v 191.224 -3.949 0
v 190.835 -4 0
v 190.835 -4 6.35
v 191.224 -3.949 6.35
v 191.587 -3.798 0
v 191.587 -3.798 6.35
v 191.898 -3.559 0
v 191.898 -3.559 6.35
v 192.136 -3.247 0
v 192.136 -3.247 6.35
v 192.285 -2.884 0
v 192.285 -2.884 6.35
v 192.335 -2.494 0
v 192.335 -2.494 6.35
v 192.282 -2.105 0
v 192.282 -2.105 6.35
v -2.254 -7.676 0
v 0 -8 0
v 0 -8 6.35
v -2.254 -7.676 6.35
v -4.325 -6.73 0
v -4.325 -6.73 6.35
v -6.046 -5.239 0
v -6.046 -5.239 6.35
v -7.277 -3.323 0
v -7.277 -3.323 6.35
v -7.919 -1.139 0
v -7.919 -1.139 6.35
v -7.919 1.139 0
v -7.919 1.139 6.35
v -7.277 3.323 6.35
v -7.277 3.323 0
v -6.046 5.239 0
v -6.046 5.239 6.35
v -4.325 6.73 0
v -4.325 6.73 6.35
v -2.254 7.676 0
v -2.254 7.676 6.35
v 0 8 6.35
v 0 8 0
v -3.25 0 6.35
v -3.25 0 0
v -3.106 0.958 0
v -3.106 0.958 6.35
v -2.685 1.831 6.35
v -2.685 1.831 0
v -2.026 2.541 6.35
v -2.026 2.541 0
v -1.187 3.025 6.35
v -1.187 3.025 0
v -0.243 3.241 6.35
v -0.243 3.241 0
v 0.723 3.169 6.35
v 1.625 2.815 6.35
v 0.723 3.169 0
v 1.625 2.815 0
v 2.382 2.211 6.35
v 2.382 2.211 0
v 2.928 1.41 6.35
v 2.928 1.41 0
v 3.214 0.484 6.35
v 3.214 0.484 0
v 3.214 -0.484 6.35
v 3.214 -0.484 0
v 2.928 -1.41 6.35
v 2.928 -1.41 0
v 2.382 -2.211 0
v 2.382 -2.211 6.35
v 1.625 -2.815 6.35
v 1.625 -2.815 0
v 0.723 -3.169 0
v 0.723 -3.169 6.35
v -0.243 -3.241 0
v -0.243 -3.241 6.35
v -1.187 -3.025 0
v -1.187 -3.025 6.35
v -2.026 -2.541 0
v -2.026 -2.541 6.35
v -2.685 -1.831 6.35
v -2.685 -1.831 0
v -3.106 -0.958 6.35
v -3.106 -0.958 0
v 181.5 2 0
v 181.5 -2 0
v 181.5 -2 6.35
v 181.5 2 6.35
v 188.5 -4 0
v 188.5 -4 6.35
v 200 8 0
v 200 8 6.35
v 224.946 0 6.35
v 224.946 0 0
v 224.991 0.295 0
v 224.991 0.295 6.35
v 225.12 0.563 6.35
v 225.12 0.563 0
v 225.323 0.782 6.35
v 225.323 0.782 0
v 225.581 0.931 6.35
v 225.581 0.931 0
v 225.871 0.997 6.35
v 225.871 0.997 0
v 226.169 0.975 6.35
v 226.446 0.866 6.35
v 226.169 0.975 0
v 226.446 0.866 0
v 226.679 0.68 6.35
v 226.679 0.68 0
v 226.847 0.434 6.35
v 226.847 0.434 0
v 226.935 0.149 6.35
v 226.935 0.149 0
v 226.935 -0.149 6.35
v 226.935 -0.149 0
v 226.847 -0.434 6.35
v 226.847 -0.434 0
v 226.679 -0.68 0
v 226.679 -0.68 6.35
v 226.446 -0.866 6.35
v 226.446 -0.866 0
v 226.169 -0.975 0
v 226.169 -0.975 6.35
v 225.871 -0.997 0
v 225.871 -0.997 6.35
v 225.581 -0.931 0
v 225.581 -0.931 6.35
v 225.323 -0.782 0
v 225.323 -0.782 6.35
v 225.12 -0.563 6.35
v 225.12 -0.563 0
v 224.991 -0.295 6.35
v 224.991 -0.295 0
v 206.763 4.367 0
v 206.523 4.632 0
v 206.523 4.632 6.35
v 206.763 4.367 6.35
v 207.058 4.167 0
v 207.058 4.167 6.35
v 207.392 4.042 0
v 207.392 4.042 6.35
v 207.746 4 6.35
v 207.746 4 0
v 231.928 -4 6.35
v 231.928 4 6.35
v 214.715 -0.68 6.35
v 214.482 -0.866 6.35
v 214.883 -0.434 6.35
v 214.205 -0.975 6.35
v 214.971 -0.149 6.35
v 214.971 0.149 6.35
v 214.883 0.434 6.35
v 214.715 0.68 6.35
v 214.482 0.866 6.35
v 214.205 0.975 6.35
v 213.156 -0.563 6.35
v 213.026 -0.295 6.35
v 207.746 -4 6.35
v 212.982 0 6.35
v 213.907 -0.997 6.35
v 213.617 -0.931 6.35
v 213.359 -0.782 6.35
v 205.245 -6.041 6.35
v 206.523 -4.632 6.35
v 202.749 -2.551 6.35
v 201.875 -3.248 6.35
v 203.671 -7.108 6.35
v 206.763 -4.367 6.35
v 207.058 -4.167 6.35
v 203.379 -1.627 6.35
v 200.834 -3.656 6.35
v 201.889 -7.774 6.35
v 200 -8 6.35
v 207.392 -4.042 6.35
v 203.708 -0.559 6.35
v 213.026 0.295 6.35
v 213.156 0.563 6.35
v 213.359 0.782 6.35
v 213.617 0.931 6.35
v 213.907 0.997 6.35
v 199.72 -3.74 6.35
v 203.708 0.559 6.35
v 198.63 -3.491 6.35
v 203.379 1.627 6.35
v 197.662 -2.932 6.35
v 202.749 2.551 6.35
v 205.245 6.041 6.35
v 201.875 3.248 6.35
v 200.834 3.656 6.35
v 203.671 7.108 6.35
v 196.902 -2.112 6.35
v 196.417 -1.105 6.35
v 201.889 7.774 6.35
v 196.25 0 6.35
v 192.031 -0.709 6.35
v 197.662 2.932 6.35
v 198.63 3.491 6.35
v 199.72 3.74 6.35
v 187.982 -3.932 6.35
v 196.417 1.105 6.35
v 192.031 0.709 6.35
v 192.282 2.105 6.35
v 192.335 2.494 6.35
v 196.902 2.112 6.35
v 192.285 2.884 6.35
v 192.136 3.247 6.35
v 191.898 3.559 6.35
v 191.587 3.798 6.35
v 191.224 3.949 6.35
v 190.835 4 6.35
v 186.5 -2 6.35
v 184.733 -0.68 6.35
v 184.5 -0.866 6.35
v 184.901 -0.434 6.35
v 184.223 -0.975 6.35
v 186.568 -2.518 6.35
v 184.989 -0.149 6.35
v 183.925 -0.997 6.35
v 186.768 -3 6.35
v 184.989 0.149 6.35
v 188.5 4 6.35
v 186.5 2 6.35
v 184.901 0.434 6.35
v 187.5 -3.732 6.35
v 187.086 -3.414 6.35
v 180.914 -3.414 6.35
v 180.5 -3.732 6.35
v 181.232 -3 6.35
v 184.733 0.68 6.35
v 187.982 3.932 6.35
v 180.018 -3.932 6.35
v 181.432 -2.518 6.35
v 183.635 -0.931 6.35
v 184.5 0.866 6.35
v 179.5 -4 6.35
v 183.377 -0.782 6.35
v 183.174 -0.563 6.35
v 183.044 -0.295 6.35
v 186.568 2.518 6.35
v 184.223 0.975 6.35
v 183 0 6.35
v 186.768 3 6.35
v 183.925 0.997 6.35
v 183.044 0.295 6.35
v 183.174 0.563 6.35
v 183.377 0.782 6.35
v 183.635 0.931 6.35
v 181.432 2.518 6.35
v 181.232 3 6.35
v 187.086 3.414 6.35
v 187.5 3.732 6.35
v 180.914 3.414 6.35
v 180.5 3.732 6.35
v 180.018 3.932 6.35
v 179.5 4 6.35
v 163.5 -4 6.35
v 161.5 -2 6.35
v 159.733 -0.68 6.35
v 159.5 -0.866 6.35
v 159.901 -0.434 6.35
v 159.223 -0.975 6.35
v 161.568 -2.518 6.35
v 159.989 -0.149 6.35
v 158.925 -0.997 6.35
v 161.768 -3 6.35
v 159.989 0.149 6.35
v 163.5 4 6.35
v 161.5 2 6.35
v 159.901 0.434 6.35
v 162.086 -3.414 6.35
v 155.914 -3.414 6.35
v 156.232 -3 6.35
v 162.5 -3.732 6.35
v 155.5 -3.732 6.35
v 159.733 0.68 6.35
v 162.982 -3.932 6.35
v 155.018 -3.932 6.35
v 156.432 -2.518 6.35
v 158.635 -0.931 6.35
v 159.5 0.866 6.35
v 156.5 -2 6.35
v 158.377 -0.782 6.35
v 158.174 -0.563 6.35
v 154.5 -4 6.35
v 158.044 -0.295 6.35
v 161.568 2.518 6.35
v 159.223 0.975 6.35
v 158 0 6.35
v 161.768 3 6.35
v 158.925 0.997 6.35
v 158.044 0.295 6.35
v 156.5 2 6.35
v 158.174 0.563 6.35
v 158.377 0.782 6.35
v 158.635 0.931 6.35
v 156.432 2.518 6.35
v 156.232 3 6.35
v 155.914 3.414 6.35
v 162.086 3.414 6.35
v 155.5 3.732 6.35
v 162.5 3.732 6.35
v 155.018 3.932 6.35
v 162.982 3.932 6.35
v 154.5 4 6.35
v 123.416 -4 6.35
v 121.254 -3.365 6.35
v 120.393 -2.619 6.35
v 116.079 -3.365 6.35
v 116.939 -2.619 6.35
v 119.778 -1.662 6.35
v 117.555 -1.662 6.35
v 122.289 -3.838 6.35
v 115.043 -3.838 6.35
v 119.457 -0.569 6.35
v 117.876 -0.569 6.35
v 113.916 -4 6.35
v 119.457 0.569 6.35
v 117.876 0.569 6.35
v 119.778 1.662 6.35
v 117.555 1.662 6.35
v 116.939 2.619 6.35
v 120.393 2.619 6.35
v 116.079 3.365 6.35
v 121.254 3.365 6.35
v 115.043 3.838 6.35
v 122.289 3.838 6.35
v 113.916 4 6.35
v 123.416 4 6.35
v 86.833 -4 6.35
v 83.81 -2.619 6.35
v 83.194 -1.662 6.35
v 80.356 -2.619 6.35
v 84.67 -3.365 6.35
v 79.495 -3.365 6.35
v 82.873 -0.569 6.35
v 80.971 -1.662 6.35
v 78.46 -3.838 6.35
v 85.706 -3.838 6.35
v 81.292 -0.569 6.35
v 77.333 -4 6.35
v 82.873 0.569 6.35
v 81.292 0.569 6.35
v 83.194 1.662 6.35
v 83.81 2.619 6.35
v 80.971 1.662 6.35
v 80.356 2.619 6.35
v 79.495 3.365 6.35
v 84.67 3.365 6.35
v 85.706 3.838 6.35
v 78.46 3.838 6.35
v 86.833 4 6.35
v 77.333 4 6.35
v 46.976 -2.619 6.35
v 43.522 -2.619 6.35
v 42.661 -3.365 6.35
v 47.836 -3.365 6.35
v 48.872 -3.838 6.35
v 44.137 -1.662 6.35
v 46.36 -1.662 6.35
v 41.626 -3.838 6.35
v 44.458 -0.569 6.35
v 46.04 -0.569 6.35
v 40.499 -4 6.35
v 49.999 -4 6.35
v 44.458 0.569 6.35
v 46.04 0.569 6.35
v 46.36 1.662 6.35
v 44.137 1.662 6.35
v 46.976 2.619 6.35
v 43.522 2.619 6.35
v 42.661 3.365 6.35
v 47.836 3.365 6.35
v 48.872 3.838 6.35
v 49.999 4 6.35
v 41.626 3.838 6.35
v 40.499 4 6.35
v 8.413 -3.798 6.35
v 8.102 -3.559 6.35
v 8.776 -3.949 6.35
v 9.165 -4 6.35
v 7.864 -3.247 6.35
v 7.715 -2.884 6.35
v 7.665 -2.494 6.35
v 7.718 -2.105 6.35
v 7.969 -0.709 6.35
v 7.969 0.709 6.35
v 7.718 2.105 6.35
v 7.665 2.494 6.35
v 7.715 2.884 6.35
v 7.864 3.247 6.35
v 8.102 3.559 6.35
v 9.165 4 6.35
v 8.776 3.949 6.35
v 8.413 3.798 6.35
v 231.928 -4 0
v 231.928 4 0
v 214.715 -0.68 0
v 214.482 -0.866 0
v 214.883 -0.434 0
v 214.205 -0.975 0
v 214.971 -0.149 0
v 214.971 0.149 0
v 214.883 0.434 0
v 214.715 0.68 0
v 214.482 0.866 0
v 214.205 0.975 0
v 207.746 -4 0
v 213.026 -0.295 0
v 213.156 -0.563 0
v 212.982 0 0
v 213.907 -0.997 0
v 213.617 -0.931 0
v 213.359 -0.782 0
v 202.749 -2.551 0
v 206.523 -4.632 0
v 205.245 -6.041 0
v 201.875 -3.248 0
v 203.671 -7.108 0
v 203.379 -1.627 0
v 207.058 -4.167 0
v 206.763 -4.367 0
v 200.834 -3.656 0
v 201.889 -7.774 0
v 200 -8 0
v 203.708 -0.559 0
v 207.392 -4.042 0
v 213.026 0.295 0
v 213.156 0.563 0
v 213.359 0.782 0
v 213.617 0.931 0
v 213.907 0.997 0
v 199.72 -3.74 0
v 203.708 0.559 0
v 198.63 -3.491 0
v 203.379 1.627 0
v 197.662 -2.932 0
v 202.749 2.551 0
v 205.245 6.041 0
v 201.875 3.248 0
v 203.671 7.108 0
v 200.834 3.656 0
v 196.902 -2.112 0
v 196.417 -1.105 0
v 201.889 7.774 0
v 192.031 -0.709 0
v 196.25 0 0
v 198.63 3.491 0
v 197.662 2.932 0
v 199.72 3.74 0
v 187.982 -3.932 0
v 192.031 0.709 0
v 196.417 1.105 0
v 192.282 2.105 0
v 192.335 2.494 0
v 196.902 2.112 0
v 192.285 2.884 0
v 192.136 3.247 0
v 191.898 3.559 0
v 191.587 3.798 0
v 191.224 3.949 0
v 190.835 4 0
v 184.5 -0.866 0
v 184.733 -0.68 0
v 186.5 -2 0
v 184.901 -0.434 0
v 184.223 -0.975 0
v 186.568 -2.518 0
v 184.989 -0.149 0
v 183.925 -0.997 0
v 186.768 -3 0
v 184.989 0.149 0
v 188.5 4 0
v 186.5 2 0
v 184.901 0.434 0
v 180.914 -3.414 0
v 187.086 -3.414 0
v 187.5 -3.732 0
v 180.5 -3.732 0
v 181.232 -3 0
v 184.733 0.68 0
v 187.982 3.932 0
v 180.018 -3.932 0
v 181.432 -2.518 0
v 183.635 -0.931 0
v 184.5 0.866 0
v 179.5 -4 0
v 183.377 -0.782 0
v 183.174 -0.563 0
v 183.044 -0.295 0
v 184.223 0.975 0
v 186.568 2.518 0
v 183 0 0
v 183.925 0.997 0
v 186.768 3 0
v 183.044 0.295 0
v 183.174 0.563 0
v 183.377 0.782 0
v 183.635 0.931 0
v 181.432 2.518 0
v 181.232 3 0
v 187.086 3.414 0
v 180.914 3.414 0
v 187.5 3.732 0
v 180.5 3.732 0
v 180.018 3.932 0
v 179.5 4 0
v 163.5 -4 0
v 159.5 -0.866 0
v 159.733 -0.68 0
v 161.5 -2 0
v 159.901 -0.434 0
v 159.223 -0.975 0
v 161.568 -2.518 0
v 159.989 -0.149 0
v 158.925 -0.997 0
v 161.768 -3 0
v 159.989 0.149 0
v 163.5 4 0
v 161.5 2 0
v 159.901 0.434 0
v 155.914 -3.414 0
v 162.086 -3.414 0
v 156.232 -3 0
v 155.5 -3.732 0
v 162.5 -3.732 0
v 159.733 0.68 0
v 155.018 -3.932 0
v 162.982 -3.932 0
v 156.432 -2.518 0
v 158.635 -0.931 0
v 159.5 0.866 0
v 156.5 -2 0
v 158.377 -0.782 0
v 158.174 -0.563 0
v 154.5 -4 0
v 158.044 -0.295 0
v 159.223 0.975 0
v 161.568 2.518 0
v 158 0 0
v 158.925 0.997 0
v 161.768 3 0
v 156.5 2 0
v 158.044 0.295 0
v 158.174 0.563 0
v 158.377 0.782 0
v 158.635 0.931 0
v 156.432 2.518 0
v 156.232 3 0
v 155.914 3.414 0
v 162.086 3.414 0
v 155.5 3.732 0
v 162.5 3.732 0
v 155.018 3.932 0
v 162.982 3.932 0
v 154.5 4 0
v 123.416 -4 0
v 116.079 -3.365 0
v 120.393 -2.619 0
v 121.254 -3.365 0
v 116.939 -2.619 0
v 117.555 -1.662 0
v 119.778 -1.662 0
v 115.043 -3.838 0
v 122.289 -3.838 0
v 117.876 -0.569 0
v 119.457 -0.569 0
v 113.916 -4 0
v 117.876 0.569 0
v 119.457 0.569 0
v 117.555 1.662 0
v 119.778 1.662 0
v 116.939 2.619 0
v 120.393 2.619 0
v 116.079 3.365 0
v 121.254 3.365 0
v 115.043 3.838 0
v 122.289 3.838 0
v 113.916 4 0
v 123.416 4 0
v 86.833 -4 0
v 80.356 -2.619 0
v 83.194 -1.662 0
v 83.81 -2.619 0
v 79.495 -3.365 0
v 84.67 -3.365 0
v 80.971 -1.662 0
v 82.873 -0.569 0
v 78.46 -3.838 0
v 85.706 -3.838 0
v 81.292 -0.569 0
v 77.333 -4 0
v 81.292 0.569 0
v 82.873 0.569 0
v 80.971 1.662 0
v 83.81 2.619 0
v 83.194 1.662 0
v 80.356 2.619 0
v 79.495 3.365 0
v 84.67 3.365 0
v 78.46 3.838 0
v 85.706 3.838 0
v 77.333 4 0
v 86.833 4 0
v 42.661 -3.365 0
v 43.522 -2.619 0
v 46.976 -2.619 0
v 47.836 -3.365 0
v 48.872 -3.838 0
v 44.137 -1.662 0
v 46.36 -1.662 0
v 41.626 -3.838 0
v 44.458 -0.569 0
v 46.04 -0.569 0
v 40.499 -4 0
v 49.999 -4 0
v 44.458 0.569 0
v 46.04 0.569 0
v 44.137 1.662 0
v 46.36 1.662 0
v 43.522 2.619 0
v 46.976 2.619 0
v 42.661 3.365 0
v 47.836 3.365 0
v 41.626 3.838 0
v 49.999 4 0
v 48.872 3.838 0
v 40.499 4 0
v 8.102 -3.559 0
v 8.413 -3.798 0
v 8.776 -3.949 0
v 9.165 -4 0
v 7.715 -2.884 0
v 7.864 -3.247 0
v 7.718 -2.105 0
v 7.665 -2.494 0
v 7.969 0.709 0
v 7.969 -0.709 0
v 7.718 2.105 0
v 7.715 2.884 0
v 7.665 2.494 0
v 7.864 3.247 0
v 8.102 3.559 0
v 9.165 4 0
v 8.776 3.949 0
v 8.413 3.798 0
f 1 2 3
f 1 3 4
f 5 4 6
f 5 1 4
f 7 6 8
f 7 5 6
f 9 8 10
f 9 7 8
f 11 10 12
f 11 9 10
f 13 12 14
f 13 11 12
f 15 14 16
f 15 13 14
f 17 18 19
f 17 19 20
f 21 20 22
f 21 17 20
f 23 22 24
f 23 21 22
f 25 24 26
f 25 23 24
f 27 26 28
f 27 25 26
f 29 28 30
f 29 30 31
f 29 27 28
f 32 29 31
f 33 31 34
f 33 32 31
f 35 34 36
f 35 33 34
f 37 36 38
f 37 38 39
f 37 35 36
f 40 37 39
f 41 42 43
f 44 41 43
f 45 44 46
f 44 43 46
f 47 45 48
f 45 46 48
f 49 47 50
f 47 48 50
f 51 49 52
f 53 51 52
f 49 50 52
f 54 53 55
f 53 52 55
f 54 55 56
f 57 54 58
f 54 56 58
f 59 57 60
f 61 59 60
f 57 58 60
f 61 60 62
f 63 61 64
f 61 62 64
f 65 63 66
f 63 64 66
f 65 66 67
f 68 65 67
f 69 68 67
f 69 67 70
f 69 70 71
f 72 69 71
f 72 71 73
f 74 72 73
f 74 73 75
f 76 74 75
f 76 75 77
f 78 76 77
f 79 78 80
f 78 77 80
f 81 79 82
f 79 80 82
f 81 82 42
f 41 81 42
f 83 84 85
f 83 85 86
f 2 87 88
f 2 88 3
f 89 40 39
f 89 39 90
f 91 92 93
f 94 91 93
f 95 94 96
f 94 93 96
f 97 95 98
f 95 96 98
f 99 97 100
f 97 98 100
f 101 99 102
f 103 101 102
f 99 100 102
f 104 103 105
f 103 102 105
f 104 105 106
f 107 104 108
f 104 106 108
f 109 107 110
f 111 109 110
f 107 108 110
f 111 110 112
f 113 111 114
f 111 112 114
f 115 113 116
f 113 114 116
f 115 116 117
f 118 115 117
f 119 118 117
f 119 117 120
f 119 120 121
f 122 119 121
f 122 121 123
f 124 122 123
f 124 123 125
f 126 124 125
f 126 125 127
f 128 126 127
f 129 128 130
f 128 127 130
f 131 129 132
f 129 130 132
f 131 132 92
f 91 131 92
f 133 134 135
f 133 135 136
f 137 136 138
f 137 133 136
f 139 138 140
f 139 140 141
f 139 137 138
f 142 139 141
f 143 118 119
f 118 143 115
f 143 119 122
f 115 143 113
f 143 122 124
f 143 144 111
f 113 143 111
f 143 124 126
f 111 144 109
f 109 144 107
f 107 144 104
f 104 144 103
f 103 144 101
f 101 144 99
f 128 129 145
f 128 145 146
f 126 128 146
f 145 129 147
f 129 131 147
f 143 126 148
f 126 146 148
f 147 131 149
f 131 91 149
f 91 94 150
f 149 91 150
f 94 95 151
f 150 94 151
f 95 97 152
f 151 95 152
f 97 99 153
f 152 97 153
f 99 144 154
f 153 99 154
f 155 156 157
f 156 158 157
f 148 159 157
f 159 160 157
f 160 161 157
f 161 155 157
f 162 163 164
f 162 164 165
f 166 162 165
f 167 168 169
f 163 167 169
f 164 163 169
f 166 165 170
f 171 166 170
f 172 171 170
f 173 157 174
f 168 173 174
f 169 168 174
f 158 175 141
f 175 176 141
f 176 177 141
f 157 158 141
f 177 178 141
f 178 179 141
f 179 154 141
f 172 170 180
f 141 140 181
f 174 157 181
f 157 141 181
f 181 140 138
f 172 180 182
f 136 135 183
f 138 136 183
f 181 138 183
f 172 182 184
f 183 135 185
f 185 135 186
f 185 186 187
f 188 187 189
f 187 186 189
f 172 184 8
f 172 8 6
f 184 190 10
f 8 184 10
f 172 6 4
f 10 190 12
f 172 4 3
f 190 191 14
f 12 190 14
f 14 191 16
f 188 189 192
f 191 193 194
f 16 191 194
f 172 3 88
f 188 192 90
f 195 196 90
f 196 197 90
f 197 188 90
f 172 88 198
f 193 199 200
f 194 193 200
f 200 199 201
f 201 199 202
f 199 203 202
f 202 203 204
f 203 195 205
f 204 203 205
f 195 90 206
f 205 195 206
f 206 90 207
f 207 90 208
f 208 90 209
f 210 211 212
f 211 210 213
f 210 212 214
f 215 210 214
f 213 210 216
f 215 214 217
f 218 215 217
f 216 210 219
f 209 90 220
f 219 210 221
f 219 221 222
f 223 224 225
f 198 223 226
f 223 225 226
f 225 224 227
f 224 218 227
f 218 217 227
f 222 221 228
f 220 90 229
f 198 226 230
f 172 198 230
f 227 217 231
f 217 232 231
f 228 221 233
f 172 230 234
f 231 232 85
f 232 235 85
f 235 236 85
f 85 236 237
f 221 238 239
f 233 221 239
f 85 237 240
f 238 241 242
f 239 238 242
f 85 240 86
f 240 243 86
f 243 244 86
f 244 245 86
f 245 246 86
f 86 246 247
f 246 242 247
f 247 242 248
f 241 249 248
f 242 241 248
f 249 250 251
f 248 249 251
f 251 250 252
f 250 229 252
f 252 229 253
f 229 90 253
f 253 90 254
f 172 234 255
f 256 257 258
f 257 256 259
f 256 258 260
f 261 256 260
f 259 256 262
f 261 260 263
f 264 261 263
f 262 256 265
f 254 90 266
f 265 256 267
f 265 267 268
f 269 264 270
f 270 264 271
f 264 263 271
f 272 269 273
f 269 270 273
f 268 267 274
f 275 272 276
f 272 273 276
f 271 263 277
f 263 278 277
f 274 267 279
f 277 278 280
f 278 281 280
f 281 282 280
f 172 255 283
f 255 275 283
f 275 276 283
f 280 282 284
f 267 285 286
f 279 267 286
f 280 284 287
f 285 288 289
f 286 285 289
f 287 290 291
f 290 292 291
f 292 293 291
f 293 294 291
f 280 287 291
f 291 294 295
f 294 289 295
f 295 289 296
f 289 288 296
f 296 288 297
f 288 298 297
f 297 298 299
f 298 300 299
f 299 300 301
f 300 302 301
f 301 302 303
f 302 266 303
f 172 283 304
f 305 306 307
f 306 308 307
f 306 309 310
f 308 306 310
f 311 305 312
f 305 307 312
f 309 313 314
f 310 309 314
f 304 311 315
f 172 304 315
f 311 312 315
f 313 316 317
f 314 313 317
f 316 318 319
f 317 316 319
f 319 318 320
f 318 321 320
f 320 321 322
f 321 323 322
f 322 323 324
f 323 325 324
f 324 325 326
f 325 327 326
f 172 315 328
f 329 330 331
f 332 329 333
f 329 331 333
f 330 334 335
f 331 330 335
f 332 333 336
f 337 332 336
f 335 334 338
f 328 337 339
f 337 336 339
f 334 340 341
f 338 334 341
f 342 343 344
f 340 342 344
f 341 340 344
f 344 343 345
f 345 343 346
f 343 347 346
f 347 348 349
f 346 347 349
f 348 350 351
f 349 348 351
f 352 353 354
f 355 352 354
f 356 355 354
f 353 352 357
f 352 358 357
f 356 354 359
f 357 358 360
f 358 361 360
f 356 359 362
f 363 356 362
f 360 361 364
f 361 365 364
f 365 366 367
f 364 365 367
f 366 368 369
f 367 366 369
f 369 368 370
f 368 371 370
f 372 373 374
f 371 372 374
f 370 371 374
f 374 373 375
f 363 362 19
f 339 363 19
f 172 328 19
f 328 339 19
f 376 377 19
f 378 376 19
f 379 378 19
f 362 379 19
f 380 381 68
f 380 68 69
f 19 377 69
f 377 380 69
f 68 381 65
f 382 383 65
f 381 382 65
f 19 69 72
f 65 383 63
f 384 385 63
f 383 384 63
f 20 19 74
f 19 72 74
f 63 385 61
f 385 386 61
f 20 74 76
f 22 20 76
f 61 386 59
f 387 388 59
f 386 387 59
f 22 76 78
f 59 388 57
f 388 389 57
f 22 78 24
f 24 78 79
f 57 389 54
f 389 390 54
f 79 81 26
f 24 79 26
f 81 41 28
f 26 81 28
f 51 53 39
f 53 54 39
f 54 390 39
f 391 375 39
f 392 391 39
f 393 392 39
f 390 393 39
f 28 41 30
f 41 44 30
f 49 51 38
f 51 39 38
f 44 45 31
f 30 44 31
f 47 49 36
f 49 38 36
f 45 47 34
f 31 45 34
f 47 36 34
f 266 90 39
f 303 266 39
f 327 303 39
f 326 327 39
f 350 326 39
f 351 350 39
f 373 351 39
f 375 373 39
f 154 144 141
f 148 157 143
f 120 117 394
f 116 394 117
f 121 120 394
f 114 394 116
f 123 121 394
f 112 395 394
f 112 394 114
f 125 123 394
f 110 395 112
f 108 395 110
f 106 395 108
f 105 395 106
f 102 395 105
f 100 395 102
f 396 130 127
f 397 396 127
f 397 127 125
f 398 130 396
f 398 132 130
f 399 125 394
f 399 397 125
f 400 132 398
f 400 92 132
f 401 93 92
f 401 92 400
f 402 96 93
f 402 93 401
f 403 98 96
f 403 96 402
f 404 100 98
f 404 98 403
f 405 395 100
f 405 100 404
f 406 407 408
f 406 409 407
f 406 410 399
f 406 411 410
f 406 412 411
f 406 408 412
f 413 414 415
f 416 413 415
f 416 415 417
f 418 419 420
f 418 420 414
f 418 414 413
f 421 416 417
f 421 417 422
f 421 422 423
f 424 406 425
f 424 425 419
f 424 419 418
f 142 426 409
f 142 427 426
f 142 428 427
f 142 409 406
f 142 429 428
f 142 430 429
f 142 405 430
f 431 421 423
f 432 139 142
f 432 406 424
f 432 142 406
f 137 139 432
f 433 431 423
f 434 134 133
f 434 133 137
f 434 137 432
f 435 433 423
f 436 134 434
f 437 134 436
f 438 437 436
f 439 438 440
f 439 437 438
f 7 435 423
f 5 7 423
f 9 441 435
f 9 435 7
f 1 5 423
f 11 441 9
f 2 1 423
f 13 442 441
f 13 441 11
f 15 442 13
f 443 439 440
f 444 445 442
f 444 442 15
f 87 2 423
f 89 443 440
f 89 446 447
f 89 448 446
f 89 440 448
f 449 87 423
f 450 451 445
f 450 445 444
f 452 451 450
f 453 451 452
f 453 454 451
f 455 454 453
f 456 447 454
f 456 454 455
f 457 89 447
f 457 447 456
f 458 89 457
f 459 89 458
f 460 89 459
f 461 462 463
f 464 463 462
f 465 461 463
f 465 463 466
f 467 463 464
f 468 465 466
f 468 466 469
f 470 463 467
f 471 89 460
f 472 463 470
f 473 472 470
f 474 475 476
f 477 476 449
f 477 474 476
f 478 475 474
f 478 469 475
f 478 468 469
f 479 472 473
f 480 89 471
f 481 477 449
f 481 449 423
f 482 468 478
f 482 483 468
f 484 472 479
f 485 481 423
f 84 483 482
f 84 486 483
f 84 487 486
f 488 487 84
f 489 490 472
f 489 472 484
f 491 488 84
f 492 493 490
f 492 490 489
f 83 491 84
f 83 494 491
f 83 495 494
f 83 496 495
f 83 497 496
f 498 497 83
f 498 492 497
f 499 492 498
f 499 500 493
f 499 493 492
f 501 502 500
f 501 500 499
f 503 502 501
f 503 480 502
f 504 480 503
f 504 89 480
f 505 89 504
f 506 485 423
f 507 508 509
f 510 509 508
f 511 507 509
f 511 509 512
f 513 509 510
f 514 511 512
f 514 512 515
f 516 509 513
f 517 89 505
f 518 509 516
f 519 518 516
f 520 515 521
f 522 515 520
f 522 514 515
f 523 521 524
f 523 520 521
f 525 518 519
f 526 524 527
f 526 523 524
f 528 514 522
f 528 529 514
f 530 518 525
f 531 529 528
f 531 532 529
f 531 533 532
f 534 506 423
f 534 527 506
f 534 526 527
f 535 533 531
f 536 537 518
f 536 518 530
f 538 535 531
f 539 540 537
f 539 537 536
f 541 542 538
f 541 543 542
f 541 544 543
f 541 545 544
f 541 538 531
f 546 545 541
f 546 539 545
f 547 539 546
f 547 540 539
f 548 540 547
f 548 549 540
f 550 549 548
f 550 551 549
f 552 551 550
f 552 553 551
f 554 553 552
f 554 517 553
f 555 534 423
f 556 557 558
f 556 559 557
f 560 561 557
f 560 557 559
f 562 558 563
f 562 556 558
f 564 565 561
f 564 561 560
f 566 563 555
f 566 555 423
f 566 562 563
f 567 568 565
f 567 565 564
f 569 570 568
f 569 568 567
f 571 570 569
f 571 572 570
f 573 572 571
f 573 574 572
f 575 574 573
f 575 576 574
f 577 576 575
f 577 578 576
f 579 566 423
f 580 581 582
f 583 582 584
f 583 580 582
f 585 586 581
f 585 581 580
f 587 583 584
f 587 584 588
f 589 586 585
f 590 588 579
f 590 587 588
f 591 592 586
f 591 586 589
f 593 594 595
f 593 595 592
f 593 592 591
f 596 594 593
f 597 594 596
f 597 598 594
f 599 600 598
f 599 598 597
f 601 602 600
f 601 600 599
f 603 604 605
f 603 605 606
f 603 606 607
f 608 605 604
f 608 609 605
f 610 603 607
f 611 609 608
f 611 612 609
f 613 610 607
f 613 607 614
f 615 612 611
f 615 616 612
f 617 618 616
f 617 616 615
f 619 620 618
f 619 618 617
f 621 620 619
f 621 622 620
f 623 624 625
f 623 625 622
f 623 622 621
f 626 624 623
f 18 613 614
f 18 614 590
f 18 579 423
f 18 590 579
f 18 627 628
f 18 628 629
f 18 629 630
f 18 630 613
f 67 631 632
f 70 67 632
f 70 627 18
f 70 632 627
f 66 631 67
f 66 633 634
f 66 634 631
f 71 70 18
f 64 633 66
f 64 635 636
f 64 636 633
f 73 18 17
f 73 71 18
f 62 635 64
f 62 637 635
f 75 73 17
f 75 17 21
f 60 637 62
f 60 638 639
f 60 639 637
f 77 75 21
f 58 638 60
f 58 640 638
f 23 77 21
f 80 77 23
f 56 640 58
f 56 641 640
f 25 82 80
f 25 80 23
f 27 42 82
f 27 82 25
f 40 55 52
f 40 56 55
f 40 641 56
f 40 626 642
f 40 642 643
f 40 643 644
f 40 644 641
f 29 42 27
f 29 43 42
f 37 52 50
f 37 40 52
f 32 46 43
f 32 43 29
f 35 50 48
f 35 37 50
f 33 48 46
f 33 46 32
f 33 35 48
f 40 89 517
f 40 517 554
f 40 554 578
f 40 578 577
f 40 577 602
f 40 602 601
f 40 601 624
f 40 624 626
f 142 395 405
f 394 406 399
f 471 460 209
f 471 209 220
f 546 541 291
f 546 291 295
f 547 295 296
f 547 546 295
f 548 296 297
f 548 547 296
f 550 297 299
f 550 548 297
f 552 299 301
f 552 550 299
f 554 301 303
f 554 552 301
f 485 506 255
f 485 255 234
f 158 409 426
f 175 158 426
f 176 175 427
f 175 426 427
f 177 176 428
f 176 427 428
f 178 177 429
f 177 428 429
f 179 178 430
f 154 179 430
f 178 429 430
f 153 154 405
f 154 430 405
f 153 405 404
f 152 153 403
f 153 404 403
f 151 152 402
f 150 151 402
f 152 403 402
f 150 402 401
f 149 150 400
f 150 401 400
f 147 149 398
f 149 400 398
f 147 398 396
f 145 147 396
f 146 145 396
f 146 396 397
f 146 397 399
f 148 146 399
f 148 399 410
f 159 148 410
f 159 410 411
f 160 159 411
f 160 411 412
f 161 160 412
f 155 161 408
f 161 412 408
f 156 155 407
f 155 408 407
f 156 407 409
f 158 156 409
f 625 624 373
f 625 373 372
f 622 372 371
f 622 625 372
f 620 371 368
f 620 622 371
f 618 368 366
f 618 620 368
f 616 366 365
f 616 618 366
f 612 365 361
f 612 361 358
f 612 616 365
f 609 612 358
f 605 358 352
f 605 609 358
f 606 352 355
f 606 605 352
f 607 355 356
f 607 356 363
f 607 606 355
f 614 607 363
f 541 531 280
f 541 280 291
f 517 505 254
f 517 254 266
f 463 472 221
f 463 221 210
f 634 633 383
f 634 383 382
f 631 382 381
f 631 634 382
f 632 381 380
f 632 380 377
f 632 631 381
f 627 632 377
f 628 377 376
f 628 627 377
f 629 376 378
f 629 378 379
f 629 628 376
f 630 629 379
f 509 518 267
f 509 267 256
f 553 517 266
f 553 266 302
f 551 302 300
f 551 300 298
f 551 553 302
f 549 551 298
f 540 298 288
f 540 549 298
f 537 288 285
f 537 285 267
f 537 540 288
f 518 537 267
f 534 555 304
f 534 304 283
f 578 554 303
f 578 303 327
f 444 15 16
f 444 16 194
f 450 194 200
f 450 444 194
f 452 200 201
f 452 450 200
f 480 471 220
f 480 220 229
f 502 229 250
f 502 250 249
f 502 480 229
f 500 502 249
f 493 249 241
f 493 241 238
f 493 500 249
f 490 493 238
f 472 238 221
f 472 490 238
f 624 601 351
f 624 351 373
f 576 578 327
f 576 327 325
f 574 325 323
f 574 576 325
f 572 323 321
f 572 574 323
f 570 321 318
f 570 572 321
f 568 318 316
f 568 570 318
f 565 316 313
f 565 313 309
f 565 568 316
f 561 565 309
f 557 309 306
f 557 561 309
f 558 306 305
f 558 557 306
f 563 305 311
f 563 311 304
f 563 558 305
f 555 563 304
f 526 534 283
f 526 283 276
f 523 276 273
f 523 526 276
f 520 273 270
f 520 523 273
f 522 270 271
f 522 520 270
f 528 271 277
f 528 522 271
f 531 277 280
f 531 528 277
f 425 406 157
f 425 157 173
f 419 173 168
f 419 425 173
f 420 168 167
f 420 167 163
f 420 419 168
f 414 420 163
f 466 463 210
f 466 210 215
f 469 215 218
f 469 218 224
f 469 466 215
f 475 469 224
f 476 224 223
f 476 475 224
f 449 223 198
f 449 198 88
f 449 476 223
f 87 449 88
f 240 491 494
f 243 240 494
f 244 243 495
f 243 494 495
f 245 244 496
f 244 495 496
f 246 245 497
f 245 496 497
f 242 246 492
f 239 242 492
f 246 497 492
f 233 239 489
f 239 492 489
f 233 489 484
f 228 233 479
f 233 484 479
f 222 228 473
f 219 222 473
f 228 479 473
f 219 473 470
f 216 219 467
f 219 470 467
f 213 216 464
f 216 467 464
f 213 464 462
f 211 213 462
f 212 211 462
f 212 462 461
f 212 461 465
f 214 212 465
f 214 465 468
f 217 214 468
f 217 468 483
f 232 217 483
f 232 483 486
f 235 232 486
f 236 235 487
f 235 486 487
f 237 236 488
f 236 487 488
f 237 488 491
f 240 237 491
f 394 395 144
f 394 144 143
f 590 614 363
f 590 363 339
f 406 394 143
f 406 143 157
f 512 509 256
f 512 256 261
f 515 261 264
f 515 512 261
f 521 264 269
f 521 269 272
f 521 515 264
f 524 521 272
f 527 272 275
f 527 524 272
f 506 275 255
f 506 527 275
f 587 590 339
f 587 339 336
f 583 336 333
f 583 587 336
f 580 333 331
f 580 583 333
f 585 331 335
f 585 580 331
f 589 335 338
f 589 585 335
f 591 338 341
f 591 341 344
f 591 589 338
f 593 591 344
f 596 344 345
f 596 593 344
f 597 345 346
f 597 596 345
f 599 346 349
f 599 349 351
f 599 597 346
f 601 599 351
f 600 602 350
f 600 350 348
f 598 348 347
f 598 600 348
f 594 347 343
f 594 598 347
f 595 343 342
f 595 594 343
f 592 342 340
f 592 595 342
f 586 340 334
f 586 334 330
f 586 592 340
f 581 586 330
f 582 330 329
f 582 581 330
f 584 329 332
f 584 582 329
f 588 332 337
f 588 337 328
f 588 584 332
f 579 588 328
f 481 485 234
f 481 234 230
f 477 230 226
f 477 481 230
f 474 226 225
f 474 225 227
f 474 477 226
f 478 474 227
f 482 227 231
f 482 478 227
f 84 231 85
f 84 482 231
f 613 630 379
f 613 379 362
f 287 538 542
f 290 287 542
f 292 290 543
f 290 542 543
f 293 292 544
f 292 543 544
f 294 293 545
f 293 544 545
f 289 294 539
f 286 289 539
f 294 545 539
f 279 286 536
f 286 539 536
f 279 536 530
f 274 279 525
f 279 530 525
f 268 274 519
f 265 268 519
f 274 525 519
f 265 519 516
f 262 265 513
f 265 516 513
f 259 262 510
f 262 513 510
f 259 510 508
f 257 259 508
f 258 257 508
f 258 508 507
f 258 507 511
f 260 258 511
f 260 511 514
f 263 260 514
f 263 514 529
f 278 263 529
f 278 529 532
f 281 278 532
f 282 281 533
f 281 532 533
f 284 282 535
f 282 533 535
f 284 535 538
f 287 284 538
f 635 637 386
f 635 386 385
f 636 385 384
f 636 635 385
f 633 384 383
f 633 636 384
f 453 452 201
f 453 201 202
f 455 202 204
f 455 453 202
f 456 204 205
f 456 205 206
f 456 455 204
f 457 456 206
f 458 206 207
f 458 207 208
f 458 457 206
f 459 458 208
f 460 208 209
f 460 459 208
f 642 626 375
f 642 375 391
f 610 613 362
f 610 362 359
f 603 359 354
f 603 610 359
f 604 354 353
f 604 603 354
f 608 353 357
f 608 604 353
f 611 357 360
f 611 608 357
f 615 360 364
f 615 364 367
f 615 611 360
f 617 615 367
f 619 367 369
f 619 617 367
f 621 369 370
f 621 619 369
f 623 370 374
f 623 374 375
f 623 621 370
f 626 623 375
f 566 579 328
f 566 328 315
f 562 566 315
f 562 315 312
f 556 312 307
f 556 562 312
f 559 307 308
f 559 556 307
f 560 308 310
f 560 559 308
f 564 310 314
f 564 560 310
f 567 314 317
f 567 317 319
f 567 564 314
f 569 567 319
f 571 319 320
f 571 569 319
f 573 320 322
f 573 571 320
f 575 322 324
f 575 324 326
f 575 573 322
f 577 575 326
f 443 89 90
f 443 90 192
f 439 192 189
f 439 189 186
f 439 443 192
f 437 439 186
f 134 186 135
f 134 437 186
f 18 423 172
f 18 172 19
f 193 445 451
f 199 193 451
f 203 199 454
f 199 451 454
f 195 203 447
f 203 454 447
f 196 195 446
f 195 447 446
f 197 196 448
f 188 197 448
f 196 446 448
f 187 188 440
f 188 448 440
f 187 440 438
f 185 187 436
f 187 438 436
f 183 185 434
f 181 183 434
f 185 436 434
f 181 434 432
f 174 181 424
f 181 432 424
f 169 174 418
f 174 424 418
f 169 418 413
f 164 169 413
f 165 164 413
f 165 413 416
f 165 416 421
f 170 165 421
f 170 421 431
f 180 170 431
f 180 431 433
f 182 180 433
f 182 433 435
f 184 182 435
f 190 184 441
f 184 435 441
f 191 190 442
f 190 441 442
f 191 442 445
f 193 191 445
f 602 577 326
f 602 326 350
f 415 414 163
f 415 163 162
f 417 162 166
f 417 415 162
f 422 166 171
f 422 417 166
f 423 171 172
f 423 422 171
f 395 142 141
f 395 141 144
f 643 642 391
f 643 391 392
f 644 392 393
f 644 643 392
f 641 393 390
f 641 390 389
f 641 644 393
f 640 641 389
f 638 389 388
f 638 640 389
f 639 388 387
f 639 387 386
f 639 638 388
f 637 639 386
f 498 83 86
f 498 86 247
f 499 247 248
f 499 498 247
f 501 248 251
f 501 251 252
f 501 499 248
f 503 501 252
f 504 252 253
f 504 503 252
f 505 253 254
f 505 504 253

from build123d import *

# Parameters (mm, degrees)
SKETCH1_R           = 1
SKETCH1_R_2         = 3.25
SKETCH1_R_3         = 3.75
BOSS_EXTRUDE1_DEPTH = 6.35


with BuildPart() as part:
    # Sketch1 → Boss-Extrude1 (new body)
    with BuildSketch(Plane(origin=(0, 0, 0), x_dir=(-1, 0, 0), z_dir=(0, 0, -1))):
        with BuildLine():
            Line((0, 8), (-200, 8))
            ThreePointArc((-200, 8), (-203.670651742, 7.108186533), (-206.52291932, 4.631578948))
            ThreePointArc((-206.52291932, 4.631578948), (-207.05771949, 4.167215025), (-207.745966692, 4))
            Line((-207.745966692, 4), (-231.92820323, 4))
            Line((-231.92820323, 4), (-231.92820323, -4))
            Line((-231.92820323, -4), (-207.745966692, -4))
            ThreePointArc((-207.745966692, -4), (-207.05771949, -4.167215025), (-206.52291932, -4.631578947))
            ThreePointArc((-206.52291932, -4.631578947), (-203.670651742, -7.108186533), (-200, -8))
            Line((-200, -8), (0, -8))
            ThreePointArc((0, -8), (8, 0), (0, 8))
        make_face()
        with Locations((-159, 0)):
            Circle(SKETCH1_R, mode=Mode.SUBTRACT)
        with Locations((-184, 0)):
            Circle(SKETCH1_R, mode=Mode.SUBTRACT)
        Circle(SKETCH1_R_2, mode=Mode.SUBTRACT)
        with Locations((-200, 0)):
            Circle(SKETCH1_R_3, mode=Mode.SUBTRACT)
        with Locations((-213.982050808, 0)):
            Circle(SKETCH1_R, mode=Mode.SUBTRACT)
        with Locations((-225.946152423, 0)):
            Circle(SKETCH1_R, mode=Mode.SUBTRACT)
        with BuildLine():
            Line((-186.499999983, 1.999999984), (-186.499999983, -1.999999983))
            ThreePointArc((-186.499999983, -1.999999983), (-187.085786426, -3.414213557), (-188.5, -4))
            Line((-188.5, -4), (-190.83484861, -4))
            ThreePointArc((-190.83484861, -4), (-192.026927731, -3.410465468), (-192.281977777, -2.105263158))
            ThreePointArc((-192.281977777, -2.105263158), (-192, 0), (-192.281977777, 2.105263158))
            ThreePointArc((-192.281977777, 2.105263158), (-192.026927731, 3.410465468), (-190.83484861, 4))
            Line((-190.83484861, 4), (-188.5, 4))
            ThreePointArc((-188.5, 4), (-187.085786426, 3.414213558), (-186.499999983, 1.999999984))
        make_face(mode=Mode.SUBTRACT)
        with BuildLine():
            Line((-181.499999977, -2.000000023), (-181.499999977, 2.000000023))
            ThreePointArc((-181.499999977, 2.000000023), (-180.914213546, 3.414213569), (-179.5, 4))
            Line((-179.5, 4), (-163.5, 4))
            ThreePointArc((-163.5, 4), (-162.085786447, 3.414213567), (-161.500000014, 2.000000014))
            Line((-161.500000014, 2.000000014), (-161.500000014, -2.000000014))
            ThreePointArc((-161.500000014, -2.000000014), (-162.085786447, -3.414213566), (-163.5, -4))
            Line((-163.5, -4), (-179.5, -4))
            ThreePointArc((-179.5, -4), (-180.914213546, -3.414213569), (-181.499999977, -2.000000023))
        make_face(mode=Mode.SUBTRACT)
        with BuildLine():
            Line((-49.998863542, -4), (-77.332575695, -4))
            ThreePointArc((-77.332575695, -4), (-81.332575695, 0), (-77.332575695, 4))
            Line((-77.332575695, 4), (-49.998863542, 4))
            ThreePointArc((-49.998863542, 4), (-45.998863542, 0), (-49.998863542, -4))
        make_face(mode=Mode.SUBTRACT)
        with BuildLine():
            Line((-123.416287847, -4), (-154.5, -4))
            ThreePointArc((-154.5, -4), (-155.914213568, -3.41421356), (-156.500000008, -1.999999992))
            Line((-156.500000008, -1.999999992), (-156.500000008, 1.999999992))
            ThreePointArc((-156.500000008, 1.999999992), (-155.914213568, 3.41421356), (-154.5, 4))
            Line((-154.5, 4), (-123.416287847, 4))
            ThreePointArc((-123.416287847, 4), (-119.416287847, 0), (-123.416287847, -4))
        make_face(mode=Mode.SUBTRACT)
        with BuildLine():
            Line((-113.916287847, 4), (-86.832575695, 4))
            ThreePointArc((-86.832575695, 4), (-82.832575695, 0), (-86.832575695, -4))
            Line((-86.832575695, -4), (-113.916287847, -4))
            ThreePointArc((-113.916287847, -4), (-117.916287847, 0), (-113.916287847, 4))
        make_face(mode=Mode.SUBTRACT)
        with BuildLine():
            Line((-40.498863542, 4), (-9.16515139, 4))
            ThreePointArc((-9.16515139, 4), (-7.973072268, 3.410465468), (-7.718022223, 2.105263158))
            ThreePointArc((-7.718022223, 2.105263158), (-8, 0), (-7.718022223, -2.105263158))
            ThreePointArc((-7.718022223, -2.105263158), (-7.973072268, -3.410465468), (-9.16515139, -4))
            Line((-9.16515139, -4), (-40.498863542, -4))
            ThreePointArc((-40.498863542, -4), (-44.498863542, 0), (-40.498863542, 4))
        make_face(mode=Mode.SUBTRACT)
    extrude(amount=-BOSS_EXTRUDE1_DEPTH)


solid = part.part
